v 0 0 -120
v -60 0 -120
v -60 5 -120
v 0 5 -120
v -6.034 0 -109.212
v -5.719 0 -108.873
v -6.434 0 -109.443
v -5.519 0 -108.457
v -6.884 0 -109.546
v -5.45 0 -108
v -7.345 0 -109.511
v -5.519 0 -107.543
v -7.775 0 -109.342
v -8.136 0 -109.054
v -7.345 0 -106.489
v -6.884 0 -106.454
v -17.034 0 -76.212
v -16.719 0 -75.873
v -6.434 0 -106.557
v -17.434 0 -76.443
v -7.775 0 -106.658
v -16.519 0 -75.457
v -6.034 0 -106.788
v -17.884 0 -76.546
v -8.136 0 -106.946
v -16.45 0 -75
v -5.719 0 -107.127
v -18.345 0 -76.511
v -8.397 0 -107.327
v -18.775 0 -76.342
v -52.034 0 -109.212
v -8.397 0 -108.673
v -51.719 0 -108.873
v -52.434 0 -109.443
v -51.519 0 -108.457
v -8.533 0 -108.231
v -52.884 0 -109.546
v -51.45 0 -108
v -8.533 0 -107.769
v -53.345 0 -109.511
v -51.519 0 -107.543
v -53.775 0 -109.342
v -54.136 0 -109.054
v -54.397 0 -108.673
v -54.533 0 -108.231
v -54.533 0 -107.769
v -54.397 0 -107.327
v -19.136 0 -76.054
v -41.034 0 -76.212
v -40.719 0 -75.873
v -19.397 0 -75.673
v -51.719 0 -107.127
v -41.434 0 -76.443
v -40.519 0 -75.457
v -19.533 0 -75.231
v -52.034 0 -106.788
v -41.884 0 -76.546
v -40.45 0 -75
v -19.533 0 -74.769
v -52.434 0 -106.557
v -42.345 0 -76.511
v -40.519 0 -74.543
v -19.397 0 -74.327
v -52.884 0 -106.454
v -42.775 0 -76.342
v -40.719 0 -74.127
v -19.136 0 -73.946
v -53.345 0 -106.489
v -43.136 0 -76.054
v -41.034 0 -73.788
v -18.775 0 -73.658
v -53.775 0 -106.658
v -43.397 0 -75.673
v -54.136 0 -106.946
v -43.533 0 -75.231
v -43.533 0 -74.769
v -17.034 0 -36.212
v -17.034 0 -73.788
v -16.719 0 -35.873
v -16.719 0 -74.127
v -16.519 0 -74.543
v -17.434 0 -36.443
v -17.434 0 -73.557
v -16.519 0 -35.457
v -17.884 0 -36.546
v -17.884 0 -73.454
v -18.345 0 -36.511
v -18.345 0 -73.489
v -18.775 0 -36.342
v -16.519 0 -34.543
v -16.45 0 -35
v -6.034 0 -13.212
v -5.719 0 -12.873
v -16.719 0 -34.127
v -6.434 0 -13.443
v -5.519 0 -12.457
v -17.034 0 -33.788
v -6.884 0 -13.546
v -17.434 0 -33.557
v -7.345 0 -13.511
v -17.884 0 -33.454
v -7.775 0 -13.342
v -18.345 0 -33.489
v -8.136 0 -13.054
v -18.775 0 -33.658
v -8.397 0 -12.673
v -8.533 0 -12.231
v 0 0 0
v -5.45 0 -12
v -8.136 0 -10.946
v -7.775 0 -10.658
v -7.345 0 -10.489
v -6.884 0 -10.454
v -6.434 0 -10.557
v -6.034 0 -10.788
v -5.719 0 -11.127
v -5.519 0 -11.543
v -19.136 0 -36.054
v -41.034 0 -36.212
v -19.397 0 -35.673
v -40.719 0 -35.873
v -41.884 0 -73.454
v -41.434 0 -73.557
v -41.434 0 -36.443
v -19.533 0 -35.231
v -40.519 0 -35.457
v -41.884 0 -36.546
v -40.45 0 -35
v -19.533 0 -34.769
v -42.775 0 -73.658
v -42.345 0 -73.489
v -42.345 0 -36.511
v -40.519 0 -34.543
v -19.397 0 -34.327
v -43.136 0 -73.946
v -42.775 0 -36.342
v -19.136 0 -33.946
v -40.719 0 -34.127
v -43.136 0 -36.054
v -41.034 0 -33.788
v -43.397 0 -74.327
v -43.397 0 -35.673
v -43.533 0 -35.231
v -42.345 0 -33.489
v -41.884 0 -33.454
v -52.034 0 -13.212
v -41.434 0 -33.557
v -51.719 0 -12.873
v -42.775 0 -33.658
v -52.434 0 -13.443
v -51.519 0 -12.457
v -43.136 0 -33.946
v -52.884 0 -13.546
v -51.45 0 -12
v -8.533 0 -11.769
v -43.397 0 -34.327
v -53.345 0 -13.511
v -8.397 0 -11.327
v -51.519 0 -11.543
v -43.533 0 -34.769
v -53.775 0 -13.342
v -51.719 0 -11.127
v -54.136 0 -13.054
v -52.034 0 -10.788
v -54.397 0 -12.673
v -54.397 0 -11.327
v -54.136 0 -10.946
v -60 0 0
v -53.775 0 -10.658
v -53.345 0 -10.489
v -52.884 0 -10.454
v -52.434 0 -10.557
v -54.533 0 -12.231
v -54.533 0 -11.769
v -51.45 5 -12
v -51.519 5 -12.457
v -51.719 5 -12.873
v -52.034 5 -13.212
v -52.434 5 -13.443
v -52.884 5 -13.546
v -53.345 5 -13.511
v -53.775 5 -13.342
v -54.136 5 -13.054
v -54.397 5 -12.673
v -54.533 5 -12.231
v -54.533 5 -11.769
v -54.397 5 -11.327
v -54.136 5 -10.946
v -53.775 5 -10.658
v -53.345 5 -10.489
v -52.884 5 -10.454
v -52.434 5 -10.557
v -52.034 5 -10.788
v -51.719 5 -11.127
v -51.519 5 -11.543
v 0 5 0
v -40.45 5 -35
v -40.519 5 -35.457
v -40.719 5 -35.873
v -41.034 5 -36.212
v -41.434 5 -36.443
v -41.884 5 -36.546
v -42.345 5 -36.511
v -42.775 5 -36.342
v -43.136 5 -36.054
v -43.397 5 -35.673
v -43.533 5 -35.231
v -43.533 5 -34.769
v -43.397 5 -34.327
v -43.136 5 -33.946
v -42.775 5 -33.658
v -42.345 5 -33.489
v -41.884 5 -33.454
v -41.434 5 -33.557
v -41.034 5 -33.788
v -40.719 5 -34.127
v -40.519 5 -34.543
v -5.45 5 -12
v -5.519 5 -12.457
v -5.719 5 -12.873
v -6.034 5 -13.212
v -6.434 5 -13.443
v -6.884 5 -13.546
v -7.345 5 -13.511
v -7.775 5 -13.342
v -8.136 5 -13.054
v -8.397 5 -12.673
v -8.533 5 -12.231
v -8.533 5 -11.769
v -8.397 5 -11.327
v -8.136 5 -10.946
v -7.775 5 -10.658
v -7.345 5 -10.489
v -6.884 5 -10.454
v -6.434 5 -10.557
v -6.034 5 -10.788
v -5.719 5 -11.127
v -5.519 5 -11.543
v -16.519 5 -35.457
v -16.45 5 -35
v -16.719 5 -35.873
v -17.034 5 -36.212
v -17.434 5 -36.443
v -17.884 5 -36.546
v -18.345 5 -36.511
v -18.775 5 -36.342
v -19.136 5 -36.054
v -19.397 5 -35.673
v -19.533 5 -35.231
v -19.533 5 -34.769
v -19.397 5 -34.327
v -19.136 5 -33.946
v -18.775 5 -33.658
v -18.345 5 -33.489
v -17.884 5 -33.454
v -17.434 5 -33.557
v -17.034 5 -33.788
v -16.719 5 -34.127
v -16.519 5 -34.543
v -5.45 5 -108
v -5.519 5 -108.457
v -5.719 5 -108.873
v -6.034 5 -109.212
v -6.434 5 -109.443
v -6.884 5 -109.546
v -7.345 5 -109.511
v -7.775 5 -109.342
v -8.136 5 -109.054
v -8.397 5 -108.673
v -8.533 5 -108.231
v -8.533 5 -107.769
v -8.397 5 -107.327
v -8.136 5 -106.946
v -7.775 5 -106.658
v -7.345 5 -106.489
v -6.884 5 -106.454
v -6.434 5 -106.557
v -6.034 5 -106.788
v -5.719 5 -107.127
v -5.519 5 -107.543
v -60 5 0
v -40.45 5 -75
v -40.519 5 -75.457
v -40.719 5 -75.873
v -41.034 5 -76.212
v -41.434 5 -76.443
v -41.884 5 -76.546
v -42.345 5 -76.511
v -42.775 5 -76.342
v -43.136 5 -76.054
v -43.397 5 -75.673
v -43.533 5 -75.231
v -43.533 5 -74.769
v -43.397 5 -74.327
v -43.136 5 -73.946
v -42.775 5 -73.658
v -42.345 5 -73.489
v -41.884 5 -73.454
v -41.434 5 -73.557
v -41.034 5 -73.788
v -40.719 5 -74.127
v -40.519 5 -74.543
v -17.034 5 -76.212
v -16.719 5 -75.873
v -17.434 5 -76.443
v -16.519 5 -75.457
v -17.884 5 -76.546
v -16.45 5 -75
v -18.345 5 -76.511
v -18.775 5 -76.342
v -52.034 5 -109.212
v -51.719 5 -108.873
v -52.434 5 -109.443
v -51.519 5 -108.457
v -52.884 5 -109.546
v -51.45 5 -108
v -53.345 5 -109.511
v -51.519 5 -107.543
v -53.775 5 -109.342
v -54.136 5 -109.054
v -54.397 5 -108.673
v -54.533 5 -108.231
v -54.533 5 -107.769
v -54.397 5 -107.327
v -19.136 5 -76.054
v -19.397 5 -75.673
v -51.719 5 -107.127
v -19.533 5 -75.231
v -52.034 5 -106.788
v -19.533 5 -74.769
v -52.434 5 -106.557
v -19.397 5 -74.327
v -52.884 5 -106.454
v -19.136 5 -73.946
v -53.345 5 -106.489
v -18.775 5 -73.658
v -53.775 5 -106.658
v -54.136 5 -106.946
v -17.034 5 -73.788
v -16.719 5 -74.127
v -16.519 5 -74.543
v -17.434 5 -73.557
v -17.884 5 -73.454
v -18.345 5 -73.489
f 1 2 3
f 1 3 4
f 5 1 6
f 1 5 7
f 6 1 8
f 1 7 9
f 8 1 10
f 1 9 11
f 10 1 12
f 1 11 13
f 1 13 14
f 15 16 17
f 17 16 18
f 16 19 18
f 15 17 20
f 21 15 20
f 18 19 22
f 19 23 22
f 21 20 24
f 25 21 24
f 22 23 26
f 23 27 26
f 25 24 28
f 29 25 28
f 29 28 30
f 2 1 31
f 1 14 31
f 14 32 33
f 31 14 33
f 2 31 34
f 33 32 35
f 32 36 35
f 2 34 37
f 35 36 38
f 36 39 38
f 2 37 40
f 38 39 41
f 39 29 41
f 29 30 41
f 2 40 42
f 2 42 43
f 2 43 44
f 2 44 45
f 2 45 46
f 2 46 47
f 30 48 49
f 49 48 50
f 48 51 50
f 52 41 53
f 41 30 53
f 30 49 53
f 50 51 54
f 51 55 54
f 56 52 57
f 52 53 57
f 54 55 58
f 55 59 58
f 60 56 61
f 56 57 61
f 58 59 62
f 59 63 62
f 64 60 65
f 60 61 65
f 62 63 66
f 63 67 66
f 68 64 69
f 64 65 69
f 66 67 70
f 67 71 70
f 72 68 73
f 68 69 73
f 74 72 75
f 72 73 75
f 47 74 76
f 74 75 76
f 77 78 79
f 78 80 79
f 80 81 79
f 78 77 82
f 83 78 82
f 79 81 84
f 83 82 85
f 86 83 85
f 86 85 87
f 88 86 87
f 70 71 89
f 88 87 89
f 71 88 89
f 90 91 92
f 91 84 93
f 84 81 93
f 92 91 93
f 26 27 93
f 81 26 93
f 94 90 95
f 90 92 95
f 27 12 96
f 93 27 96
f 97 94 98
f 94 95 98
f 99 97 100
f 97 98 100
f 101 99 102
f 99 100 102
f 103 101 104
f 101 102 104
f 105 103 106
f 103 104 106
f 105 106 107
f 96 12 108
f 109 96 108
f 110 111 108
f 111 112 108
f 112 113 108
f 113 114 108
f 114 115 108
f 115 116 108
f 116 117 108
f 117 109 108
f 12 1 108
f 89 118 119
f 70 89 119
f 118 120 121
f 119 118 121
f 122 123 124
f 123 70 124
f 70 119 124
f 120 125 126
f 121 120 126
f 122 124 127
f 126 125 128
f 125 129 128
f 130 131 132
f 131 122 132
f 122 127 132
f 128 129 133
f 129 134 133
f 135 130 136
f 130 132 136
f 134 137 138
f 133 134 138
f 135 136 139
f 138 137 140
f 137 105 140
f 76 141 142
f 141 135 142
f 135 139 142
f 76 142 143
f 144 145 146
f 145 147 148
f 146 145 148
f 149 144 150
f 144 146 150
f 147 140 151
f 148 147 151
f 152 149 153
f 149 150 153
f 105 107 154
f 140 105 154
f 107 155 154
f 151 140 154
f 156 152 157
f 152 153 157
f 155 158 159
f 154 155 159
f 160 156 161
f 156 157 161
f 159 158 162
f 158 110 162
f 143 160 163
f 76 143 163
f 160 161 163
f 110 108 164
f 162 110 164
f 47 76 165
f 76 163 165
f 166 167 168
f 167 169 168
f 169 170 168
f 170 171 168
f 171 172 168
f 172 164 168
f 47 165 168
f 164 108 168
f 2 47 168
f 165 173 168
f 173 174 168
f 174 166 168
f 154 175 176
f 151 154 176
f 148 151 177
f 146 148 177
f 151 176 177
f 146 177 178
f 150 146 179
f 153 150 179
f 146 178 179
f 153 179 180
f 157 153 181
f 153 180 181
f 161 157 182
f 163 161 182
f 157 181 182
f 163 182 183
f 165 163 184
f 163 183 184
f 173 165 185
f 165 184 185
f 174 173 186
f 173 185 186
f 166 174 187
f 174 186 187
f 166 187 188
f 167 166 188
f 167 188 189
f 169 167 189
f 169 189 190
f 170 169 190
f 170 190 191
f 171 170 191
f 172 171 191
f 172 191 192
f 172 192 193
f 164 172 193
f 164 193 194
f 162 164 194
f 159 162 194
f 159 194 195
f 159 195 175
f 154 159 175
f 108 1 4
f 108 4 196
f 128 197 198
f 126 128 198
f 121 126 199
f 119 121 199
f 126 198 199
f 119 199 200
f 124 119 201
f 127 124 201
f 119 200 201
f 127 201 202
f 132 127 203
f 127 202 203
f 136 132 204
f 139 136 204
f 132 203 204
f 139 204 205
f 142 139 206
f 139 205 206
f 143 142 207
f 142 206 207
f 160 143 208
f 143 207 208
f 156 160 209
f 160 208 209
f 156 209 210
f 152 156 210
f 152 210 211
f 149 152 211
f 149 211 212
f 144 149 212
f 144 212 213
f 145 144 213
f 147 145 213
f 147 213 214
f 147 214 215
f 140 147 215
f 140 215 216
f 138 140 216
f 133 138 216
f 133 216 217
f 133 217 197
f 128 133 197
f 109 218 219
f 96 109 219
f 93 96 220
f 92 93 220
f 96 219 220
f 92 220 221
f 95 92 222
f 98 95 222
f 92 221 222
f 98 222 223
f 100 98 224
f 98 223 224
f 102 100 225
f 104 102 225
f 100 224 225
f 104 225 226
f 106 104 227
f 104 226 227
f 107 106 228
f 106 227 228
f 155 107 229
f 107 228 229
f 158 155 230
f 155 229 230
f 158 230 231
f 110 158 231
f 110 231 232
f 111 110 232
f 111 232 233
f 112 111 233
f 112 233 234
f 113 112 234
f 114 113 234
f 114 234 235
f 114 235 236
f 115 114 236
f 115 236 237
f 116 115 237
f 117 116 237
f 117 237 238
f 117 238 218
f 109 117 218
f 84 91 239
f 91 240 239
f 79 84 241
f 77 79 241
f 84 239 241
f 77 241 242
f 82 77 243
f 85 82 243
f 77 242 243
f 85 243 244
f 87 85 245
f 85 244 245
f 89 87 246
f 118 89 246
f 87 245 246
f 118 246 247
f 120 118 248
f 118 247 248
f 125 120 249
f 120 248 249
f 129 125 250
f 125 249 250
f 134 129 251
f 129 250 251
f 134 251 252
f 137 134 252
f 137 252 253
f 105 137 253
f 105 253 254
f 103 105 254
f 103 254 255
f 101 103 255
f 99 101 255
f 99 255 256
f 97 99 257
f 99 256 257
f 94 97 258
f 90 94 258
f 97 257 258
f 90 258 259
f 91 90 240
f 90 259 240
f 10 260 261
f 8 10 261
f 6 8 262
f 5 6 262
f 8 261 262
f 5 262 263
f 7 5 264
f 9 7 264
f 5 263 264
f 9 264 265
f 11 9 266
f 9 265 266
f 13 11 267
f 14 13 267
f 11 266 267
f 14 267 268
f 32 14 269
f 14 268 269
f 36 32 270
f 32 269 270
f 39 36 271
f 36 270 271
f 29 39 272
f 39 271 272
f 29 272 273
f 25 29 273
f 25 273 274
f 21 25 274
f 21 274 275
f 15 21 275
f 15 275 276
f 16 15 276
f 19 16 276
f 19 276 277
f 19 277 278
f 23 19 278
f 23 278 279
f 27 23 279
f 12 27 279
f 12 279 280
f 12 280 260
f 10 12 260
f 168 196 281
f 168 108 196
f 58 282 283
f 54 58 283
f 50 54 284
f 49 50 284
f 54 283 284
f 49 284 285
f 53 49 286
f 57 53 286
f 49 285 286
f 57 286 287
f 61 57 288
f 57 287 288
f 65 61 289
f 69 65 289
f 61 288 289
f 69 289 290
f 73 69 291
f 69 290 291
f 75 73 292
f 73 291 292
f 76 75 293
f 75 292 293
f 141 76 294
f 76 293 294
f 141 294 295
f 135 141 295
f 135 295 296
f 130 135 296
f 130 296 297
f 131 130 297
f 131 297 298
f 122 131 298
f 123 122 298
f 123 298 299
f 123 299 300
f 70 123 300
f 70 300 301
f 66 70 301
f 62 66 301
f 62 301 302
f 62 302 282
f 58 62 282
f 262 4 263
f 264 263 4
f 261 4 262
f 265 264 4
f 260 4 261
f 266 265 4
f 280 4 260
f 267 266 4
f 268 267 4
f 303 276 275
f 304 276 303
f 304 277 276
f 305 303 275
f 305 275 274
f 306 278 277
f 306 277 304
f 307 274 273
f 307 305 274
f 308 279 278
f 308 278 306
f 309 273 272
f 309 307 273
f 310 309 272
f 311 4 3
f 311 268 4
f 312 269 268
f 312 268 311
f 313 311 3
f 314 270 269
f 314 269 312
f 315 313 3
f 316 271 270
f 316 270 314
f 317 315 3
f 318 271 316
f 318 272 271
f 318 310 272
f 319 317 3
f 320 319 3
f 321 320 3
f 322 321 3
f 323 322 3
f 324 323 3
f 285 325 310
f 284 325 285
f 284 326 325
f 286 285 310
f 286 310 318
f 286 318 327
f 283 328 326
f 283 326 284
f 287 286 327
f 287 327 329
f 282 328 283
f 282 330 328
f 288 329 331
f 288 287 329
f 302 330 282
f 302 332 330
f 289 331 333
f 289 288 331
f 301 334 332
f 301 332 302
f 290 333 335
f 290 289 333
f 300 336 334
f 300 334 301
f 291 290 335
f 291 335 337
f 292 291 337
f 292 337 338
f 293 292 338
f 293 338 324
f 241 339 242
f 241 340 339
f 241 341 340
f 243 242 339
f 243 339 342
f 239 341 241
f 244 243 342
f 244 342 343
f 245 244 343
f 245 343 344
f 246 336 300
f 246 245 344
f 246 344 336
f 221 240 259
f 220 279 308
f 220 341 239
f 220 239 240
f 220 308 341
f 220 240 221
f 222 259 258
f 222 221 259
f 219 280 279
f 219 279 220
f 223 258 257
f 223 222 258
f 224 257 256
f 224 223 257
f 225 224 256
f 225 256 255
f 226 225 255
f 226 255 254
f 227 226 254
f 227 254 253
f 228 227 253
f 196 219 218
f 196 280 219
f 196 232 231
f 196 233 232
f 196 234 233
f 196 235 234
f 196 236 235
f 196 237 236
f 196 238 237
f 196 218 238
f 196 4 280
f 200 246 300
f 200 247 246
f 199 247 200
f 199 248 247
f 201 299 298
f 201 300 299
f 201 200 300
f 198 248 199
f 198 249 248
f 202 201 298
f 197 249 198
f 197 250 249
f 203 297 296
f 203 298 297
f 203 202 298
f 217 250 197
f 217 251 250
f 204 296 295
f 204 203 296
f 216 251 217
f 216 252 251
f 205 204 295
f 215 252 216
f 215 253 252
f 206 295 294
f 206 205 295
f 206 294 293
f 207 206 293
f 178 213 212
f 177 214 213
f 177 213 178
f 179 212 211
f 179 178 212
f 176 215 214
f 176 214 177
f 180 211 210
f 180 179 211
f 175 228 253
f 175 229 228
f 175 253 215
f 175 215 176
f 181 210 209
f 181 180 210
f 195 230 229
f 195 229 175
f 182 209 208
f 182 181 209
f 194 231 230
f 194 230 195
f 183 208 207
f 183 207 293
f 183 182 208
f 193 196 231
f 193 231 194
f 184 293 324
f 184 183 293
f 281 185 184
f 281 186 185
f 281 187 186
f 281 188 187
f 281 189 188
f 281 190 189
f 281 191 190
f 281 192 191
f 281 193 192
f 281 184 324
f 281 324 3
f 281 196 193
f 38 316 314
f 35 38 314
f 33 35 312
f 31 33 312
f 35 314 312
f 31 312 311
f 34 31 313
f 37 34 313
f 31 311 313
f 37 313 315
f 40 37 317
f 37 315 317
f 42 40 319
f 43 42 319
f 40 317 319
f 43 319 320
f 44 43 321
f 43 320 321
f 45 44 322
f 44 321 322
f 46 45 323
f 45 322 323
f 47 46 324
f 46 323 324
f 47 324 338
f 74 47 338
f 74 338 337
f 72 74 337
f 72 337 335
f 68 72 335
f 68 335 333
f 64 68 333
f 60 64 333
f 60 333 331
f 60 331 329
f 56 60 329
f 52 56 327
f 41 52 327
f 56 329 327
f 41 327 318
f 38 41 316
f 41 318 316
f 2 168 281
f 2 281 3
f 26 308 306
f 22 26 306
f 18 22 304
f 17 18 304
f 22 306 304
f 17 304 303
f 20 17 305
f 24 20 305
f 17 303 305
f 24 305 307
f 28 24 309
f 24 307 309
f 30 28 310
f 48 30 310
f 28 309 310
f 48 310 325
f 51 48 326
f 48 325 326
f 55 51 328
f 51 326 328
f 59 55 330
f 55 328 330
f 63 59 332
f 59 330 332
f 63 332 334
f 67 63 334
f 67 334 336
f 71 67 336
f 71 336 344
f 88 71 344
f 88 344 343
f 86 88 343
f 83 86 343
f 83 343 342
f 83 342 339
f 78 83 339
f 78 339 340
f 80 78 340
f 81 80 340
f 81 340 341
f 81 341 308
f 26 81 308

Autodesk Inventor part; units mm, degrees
ref_plane "YZ Plane" through (0, 0, 0) normal (1, 0, 0) x (0, 1, 0)
ref_plane "XZ Plane" through (0, 0, 0) normal (0, 1, 0) x (-1, 0, 0)
ref_plane "XY Plane" through (0, 0, 0) normal (0, 0, 1) x (1, 0, 0)
sketch "Sketch1" plane through (0, 0, 0) normal (0, 1, 0) x (-1, 0, 0)
  line L0 (0, 0) -> (60, 0)
  line L1 (60, 0) -> (60, -120)
  line L2 (60, -120) -> (0, -120)
  line L3 (0, -120) -> (0, 0)
  dimension "d0" = 60
  dimension "d1" = 120
extrude "Extrusion1" add sketch "Sketch1" along normal blind 5
sketch "Sketch3" plane through (-60, 0, 0) normal (0, 0, 1) x (1, 0, 0)
  line L0 (0, 0) -> (60, 0) projected
  circle A0 centre (38.75, 11) radius 1.55
  circle A1 centre (21.25, 11) radius 1.55
  dimension "d22" = 3.1
  dimension "d23" = 3.1
  dimension "d25" = 17.5
  dimension "d26" = 11
  dimension "d27" = 11
extrude "Extrusion3" cut sketch "Sketch3" against normal through all
sketch "Sketch5" plane through (0, 5, 0) normal (0, 1, 0) x (1, 0, 0)
  line L0 (0, 0) -> (0, 120) projected
  line L1 (0, 120) -> (0, 108)
  line L2 (0, 108) -> (-7, 108)
  line L3 (-60, 120) -> (-60, 0) projected
  circle A0 centre (-7, 108) radius 1.55
  line L4 (0, 120) -> (-60, 120) projected
  line L5 (-30, 120) -> (-30, 0)
  line L6 (-45, 0) -> (-15, 0) projected
  line L7 (0, 60) -> (-60, 60)
  circle A1 centre (-53, 108) radius 1.55
  circle A2 centre (-7, 12) radius 1.55
  circle A3 centre (-53, 12) radius 1.55
  dimension "d47" = 12
  dimension "d48" = 7
  dimension "d49" = 3.1
extrude "Extrusion5" cut sketch "Sketch5" against normal blind 10 contours A0 | A1 | A2 | A3
sketch "Sketch7" plane through (0, 5, 0) normal (0, 1, 0) x (1, 0, 0)
  circle A0 centre (-18, 75) radius 2.45 projected
  circle A1 centre (-42, 75) radius 2.45 projected
  circle A2 centre (-42, 35) radius 2.45 projected
  circle A3 centre (-18, 35) radius 2.45 projected
  circle A4 centre (-18, 35) radius 1.55
  circle A5 centre (-42, 35) radius 1.55
  circle A6 centre (-18, 75) radius 1.55
  circle A7 centre (-42, 75) radius 1.55
  point P0 (0, 0)
  dimension "d64" = 3.1
  dimension "d65" = 3.1
  dimension "d66" = 3.1
  dimension "d67" = 3.1
extrude "Extrusion7" cut sketch "Sketch7" against normal blind 10 contours A4 | A5 | A6 | A7
properties part number "bottom_plate" material "PET Plastic"
